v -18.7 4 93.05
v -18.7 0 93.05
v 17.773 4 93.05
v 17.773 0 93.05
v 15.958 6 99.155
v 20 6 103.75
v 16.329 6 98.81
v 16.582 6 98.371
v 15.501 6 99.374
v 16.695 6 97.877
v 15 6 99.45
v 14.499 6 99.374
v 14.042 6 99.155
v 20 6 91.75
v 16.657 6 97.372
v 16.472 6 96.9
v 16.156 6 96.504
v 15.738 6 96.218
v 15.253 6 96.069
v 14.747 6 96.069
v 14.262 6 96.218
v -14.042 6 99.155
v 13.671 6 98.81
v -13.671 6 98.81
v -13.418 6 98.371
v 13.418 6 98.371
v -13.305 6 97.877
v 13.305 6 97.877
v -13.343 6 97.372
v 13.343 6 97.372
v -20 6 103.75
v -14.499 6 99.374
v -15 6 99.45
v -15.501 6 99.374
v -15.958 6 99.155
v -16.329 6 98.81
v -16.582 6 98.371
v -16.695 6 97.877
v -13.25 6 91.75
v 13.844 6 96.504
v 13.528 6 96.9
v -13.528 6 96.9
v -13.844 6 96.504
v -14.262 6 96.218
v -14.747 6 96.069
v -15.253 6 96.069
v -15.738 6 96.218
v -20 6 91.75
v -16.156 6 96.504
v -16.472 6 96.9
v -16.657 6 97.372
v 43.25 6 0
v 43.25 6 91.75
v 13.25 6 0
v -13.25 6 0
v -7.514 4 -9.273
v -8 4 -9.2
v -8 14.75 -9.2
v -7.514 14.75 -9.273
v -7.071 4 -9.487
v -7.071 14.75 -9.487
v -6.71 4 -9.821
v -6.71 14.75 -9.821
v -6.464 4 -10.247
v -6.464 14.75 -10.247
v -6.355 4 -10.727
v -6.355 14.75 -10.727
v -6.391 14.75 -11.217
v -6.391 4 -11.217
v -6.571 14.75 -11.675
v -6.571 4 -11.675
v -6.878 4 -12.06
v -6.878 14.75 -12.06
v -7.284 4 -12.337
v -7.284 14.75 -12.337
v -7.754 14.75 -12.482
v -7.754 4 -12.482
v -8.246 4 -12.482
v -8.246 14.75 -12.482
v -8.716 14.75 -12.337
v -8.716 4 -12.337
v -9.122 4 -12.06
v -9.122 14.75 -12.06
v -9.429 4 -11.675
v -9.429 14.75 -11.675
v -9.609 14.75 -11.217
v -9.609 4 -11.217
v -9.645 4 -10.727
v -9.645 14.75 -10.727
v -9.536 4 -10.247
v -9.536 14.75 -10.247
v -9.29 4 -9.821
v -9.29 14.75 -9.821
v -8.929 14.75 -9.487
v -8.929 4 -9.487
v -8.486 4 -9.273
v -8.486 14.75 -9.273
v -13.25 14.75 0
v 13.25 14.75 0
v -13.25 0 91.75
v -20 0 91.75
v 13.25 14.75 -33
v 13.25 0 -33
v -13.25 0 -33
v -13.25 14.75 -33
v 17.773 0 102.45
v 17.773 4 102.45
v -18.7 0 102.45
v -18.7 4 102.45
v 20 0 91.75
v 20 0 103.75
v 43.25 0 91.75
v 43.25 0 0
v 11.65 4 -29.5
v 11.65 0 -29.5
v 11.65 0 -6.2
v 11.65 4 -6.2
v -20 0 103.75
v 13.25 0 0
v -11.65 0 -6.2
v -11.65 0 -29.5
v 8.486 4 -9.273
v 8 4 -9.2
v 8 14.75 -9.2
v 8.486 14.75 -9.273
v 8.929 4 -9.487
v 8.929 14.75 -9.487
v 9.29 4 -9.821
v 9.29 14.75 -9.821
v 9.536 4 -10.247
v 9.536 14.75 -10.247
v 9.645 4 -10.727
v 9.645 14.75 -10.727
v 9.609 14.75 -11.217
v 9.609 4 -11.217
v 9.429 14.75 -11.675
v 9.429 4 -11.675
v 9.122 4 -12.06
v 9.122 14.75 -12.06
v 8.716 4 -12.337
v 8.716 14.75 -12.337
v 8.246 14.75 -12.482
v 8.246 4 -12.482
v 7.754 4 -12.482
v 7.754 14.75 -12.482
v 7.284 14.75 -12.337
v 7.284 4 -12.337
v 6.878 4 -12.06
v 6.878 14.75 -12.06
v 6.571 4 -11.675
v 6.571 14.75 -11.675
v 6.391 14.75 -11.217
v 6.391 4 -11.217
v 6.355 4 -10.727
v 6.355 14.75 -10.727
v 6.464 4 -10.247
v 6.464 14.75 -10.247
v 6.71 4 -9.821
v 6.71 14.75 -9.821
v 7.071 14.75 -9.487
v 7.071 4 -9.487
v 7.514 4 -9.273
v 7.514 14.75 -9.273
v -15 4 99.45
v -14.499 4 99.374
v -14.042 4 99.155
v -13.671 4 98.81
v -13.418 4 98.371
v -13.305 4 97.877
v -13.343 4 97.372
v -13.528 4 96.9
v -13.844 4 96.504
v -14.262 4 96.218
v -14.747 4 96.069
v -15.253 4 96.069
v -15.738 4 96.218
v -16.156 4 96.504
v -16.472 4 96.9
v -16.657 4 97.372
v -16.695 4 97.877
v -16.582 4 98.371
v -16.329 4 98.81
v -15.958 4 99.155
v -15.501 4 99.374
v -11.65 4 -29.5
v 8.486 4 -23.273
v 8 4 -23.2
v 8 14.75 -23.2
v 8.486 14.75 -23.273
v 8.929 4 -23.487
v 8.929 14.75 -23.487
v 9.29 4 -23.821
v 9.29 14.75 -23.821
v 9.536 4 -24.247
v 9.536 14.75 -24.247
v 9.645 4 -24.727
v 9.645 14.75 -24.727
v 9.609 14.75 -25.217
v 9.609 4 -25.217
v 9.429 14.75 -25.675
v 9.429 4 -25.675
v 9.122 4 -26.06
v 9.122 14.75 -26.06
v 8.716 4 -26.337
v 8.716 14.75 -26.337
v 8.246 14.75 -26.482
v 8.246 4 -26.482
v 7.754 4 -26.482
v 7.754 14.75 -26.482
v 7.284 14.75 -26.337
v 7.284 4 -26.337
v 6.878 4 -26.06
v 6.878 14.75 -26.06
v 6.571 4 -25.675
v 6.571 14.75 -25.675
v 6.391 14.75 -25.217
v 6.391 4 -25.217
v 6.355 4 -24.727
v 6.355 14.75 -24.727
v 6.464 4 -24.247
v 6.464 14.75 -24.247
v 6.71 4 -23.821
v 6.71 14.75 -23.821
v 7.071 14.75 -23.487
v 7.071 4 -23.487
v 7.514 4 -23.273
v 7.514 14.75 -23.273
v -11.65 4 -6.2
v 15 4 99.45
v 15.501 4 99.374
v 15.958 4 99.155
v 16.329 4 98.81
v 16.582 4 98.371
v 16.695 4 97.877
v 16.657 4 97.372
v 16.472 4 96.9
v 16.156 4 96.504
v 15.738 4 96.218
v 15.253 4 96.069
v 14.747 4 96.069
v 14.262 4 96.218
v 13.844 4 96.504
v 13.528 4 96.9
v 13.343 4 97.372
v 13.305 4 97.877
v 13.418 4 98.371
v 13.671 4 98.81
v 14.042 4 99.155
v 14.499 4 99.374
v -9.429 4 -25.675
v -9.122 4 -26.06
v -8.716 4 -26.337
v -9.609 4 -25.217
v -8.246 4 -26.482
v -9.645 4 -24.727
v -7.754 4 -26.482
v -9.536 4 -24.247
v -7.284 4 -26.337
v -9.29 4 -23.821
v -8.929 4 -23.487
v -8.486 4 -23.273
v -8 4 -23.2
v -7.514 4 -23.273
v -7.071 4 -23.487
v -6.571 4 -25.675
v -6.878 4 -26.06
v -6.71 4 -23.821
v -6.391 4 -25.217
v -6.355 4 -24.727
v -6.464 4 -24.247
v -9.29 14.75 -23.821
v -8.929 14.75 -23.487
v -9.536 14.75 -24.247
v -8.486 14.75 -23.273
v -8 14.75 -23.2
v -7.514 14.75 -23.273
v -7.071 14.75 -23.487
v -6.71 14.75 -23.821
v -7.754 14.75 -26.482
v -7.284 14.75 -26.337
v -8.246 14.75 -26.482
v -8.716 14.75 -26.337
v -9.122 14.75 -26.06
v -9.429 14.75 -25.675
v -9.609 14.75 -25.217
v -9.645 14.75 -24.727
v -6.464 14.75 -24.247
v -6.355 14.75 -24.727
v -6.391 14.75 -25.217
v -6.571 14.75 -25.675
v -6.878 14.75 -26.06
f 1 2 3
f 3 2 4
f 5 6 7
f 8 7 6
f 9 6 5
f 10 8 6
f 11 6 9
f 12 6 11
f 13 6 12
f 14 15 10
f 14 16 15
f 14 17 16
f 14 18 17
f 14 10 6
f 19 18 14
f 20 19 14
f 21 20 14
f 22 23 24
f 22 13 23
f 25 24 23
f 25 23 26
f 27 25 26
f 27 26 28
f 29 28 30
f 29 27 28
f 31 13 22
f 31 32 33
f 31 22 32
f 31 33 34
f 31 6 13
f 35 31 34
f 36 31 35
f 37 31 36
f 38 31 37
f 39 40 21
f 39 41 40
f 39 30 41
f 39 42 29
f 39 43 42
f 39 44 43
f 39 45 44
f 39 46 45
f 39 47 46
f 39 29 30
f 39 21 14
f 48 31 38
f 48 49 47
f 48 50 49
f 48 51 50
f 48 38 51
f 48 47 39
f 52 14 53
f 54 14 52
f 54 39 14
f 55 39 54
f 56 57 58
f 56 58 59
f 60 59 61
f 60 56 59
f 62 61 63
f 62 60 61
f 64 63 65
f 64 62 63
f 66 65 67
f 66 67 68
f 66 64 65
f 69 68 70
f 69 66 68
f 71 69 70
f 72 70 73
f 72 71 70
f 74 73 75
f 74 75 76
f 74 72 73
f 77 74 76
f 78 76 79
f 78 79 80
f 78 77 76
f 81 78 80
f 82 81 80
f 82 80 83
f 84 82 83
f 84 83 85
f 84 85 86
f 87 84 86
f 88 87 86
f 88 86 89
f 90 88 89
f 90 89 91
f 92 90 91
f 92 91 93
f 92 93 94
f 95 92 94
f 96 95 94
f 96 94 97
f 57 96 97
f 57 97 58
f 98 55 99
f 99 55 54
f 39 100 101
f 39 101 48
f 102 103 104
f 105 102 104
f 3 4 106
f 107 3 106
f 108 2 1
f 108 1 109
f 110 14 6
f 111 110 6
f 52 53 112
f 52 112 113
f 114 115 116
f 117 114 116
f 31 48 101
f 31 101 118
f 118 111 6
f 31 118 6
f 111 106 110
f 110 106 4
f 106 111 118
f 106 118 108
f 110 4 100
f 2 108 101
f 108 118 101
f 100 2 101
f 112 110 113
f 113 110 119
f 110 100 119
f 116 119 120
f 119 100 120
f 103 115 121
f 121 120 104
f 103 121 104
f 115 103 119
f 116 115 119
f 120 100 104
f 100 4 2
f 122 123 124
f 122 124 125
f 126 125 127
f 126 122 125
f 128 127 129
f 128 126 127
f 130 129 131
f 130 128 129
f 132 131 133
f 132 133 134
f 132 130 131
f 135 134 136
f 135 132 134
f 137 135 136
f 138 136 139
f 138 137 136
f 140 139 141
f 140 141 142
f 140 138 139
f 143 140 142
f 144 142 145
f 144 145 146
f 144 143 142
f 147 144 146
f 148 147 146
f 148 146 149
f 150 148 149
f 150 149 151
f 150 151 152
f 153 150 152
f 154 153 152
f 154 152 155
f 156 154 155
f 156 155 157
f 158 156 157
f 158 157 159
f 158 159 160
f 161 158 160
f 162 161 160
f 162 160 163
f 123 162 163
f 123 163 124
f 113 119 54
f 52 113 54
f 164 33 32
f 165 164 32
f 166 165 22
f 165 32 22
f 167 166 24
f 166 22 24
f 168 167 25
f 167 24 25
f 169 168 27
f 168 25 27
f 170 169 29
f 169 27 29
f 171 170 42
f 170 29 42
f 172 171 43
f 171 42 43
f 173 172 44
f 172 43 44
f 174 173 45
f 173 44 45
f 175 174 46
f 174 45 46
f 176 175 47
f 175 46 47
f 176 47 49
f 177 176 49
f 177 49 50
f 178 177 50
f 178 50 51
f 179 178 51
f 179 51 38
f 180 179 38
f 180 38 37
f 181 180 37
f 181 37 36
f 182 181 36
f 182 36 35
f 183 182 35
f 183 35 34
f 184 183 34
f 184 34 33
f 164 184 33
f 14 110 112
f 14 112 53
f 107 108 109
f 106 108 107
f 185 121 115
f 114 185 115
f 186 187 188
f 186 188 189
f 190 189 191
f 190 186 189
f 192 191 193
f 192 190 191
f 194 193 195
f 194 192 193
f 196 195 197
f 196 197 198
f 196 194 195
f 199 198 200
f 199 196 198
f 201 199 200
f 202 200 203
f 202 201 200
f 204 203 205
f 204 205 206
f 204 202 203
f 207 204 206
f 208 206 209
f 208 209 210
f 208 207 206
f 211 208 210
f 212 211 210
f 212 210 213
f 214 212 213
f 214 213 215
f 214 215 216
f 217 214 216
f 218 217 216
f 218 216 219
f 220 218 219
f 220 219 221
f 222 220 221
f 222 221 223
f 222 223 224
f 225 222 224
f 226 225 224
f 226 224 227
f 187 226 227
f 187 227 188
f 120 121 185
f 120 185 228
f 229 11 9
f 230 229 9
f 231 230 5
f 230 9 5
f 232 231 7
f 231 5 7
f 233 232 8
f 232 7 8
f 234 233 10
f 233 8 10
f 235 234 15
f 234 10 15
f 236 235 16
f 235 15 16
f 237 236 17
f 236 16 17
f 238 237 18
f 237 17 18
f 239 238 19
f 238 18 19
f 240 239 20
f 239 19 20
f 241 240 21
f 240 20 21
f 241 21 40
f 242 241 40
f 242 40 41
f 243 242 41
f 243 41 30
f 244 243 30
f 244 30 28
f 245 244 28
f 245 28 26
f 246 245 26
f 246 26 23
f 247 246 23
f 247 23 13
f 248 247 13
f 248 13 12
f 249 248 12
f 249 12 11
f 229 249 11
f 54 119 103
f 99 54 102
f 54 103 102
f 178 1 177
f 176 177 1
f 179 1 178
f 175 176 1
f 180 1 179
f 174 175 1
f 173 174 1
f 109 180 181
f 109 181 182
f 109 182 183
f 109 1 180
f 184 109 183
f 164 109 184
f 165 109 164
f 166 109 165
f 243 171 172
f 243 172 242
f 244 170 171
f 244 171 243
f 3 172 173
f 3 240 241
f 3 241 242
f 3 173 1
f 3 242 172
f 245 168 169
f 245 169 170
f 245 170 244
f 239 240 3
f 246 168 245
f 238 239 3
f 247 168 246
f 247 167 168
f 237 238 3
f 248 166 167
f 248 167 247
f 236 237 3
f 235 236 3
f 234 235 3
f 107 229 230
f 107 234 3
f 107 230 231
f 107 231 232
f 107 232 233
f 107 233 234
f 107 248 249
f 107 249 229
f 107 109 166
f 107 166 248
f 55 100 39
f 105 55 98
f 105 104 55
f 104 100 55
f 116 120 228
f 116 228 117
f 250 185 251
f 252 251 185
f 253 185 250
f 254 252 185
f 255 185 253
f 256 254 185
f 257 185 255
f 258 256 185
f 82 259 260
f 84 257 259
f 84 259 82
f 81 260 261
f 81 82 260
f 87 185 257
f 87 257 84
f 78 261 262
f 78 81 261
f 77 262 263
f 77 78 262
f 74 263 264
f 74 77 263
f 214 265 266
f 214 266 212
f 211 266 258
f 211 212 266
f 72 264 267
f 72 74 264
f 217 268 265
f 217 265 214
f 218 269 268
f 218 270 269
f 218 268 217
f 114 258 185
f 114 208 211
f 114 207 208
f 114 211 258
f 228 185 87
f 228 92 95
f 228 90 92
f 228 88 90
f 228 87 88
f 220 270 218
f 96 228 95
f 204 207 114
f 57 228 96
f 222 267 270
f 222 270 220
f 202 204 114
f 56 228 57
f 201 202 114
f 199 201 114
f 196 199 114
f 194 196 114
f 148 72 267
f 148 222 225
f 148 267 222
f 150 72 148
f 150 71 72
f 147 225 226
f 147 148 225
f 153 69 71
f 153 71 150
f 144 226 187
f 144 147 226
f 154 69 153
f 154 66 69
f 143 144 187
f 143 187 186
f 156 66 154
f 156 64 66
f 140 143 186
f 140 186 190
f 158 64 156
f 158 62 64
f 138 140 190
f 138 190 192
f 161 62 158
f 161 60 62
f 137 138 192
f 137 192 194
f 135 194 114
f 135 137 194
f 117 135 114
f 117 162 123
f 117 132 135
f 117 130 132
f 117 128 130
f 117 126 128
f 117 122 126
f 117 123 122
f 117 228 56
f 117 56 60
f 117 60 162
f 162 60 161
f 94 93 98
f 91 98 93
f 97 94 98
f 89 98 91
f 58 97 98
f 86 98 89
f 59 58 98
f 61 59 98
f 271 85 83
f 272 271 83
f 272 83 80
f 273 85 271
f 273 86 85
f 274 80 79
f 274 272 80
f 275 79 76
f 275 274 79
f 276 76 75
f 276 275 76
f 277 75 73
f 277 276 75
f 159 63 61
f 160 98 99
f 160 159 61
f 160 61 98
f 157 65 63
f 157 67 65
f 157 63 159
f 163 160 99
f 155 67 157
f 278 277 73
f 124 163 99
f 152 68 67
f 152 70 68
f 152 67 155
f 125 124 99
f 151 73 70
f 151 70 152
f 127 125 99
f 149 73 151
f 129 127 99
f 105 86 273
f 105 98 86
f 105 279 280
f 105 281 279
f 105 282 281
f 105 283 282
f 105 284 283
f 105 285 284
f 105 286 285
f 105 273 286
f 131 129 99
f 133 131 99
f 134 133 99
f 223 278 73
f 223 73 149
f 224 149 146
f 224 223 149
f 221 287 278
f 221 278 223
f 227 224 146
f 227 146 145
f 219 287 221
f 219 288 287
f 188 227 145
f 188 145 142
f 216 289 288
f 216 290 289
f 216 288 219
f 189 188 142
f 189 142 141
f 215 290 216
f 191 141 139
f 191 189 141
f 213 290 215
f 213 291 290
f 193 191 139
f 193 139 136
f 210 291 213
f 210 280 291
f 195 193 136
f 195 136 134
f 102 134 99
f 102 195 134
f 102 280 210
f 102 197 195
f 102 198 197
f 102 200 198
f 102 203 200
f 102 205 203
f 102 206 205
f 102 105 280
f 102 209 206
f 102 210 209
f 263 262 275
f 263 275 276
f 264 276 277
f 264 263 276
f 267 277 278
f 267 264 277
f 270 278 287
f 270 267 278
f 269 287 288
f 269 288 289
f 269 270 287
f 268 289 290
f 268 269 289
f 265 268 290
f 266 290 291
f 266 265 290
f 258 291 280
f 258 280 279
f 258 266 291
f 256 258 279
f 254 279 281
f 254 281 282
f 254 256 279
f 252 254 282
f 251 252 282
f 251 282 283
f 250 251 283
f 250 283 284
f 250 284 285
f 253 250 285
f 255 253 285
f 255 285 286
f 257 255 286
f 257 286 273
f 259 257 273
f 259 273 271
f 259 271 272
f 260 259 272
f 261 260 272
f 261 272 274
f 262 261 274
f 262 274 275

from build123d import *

# Parameters (mm, degrees)
SKETCH6_R                = 1.65
BOSS_EXTRUDE3_DEPTH      = 14.75
SKETCH9_W                = 26.5
SKETCH9_H                = 6
BOSS_EXTRUDE4_DEPTH      = 103.75
BOSS_EXTRUDE6_DEPTH      = 6.75
BOSS_EXTRUDE6_DEPTH_BACK = 33.25
SKETCH14_W               = 12
SKETCH14_H               = 6
SKETCH10_R               = 1.7
CUT_EXTRUDE1_DEPTH       = 107.021813793
SKETCH11_W               = 23.3
SKETCH11_H               = 23.3
CUT_EXTRUDE2_DEPTH       = 4
SKETCH12_W               = 36.472759933
SKETCH12_H               = 9.4
CUT_EXTRUDE3_DEPTH       = 4
SKETCH15_W               = 91.75
SKETCH15_H               = 6
BOSS_EXTRUDE8_DEPTH      = 30


with BuildPart() as part:
    # Sketch6 → Boss-Extrude3 (new body)
    with BuildSketch(Plane(origin=(0, 0, 0), x_dir=(1, 0, 0), z_dir=(0, 1, 0))):
        Polygon((-13.25, 3.3), (-13.25, 0), (13.25, 0), (13.25, 3.3), (13.25, 33), (-13.25, 33), align=None)
        with Locations(Location((8, 10.85, 0), (0, 0, 270))):
            Circle(SKETCH6_R, mode=Mode.SUBTRACT)
        with Locations(Location((8, 24.85, 0), (0, 0, 270))):
            Circle(SKETCH6_R, mode=Mode.SUBTRACT)
        with Locations(Location((-8, 24.85, 0), (0, 0, 270))):
            Circle(SKETCH6_R, mode=Mode.SUBTRACT)
        with Locations(Location((-8, 10.85, 0), (0, 0, 270))):
            Circle(SKETCH6_R, mode=Mode.SUBTRACT)
    extrude(amount=BOSS_EXTRUDE3_DEPTH)

    # Sketch9 → Boss-Extrude4 (add)
    with BuildSketch(Plane.XY):
        with Locations((0, 3)):
            Rectangle(SKETCH9_W, SKETCH9_H)
    extrude(amount=BOSS_EXTRUDE4_DEPTH)

    # Sketch14 → Boss-Extrude6 (add, two sides: drawn at the far end of the back side and taken through both)
    with BuildSketch(Plane.ZY.offset(13.25).offset(-BOSS_EXTRUDE6_DEPTH_BACK)):
        with Locations((97.75, 3)):
            Rectangle(SKETCH14_W, SKETCH14_H)
    extrude(amount=BOSS_EXTRUDE6_DEPTH + BOSS_EXTRUDE6_DEPTH_BACK)

    # Sketch10 → Cut-Extrude1 (cut, through all)
    with BuildSketch(Plane(origin=(0, 6, 0), x_dir=(1, 0, 0), z_dir=(0, 1, 0))):
        with Locations(Location((-15, -97.75, 0), (0, 0, 270))):
            Circle(SKETCH10_R)
        with Locations(Location((15, -97.75, 0), (0, 0, 270))):
            Circle(SKETCH10_R)
    extrude(amount=-CUT_EXTRUDE1_DEPTH, mode=Mode.SUBTRACT)

    # Sketch11 → Cut-Extrude2 (cut)
    with BuildSketch(Plane.XZ):
        with Locations((0, -17.85)):
            Rectangle(SKETCH11_W, SKETCH11_H)
    extrude(amount=-CUT_EXTRUDE2_DEPTH, mode=Mode.SUBTRACT)

    # Sketch12 → Cut-Extrude3 (cut)
    with BuildSketch(Plane.XZ):
        with Locations((-0.463620034, 97.75)):
            Rectangle(SKETCH12_W, SKETCH12_H)
    extrude(amount=-CUT_EXTRUDE3_DEPTH, mode=Mode.SUBTRACT)

    # Sketch15 → Boss-Extrude8 (add)
    with BuildSketch(Plane(origin=(13.25, 0, 0), x_dir=(0, 0, -1), z_dir=(1, 0, 0))):
        with Locations((-45.875, 3)):
            Rectangle(SKETCH15_W, SKETCH15_H)
    extrude(amount=BOSS_EXTRUDE8_DEPTH)


solid = part.part
